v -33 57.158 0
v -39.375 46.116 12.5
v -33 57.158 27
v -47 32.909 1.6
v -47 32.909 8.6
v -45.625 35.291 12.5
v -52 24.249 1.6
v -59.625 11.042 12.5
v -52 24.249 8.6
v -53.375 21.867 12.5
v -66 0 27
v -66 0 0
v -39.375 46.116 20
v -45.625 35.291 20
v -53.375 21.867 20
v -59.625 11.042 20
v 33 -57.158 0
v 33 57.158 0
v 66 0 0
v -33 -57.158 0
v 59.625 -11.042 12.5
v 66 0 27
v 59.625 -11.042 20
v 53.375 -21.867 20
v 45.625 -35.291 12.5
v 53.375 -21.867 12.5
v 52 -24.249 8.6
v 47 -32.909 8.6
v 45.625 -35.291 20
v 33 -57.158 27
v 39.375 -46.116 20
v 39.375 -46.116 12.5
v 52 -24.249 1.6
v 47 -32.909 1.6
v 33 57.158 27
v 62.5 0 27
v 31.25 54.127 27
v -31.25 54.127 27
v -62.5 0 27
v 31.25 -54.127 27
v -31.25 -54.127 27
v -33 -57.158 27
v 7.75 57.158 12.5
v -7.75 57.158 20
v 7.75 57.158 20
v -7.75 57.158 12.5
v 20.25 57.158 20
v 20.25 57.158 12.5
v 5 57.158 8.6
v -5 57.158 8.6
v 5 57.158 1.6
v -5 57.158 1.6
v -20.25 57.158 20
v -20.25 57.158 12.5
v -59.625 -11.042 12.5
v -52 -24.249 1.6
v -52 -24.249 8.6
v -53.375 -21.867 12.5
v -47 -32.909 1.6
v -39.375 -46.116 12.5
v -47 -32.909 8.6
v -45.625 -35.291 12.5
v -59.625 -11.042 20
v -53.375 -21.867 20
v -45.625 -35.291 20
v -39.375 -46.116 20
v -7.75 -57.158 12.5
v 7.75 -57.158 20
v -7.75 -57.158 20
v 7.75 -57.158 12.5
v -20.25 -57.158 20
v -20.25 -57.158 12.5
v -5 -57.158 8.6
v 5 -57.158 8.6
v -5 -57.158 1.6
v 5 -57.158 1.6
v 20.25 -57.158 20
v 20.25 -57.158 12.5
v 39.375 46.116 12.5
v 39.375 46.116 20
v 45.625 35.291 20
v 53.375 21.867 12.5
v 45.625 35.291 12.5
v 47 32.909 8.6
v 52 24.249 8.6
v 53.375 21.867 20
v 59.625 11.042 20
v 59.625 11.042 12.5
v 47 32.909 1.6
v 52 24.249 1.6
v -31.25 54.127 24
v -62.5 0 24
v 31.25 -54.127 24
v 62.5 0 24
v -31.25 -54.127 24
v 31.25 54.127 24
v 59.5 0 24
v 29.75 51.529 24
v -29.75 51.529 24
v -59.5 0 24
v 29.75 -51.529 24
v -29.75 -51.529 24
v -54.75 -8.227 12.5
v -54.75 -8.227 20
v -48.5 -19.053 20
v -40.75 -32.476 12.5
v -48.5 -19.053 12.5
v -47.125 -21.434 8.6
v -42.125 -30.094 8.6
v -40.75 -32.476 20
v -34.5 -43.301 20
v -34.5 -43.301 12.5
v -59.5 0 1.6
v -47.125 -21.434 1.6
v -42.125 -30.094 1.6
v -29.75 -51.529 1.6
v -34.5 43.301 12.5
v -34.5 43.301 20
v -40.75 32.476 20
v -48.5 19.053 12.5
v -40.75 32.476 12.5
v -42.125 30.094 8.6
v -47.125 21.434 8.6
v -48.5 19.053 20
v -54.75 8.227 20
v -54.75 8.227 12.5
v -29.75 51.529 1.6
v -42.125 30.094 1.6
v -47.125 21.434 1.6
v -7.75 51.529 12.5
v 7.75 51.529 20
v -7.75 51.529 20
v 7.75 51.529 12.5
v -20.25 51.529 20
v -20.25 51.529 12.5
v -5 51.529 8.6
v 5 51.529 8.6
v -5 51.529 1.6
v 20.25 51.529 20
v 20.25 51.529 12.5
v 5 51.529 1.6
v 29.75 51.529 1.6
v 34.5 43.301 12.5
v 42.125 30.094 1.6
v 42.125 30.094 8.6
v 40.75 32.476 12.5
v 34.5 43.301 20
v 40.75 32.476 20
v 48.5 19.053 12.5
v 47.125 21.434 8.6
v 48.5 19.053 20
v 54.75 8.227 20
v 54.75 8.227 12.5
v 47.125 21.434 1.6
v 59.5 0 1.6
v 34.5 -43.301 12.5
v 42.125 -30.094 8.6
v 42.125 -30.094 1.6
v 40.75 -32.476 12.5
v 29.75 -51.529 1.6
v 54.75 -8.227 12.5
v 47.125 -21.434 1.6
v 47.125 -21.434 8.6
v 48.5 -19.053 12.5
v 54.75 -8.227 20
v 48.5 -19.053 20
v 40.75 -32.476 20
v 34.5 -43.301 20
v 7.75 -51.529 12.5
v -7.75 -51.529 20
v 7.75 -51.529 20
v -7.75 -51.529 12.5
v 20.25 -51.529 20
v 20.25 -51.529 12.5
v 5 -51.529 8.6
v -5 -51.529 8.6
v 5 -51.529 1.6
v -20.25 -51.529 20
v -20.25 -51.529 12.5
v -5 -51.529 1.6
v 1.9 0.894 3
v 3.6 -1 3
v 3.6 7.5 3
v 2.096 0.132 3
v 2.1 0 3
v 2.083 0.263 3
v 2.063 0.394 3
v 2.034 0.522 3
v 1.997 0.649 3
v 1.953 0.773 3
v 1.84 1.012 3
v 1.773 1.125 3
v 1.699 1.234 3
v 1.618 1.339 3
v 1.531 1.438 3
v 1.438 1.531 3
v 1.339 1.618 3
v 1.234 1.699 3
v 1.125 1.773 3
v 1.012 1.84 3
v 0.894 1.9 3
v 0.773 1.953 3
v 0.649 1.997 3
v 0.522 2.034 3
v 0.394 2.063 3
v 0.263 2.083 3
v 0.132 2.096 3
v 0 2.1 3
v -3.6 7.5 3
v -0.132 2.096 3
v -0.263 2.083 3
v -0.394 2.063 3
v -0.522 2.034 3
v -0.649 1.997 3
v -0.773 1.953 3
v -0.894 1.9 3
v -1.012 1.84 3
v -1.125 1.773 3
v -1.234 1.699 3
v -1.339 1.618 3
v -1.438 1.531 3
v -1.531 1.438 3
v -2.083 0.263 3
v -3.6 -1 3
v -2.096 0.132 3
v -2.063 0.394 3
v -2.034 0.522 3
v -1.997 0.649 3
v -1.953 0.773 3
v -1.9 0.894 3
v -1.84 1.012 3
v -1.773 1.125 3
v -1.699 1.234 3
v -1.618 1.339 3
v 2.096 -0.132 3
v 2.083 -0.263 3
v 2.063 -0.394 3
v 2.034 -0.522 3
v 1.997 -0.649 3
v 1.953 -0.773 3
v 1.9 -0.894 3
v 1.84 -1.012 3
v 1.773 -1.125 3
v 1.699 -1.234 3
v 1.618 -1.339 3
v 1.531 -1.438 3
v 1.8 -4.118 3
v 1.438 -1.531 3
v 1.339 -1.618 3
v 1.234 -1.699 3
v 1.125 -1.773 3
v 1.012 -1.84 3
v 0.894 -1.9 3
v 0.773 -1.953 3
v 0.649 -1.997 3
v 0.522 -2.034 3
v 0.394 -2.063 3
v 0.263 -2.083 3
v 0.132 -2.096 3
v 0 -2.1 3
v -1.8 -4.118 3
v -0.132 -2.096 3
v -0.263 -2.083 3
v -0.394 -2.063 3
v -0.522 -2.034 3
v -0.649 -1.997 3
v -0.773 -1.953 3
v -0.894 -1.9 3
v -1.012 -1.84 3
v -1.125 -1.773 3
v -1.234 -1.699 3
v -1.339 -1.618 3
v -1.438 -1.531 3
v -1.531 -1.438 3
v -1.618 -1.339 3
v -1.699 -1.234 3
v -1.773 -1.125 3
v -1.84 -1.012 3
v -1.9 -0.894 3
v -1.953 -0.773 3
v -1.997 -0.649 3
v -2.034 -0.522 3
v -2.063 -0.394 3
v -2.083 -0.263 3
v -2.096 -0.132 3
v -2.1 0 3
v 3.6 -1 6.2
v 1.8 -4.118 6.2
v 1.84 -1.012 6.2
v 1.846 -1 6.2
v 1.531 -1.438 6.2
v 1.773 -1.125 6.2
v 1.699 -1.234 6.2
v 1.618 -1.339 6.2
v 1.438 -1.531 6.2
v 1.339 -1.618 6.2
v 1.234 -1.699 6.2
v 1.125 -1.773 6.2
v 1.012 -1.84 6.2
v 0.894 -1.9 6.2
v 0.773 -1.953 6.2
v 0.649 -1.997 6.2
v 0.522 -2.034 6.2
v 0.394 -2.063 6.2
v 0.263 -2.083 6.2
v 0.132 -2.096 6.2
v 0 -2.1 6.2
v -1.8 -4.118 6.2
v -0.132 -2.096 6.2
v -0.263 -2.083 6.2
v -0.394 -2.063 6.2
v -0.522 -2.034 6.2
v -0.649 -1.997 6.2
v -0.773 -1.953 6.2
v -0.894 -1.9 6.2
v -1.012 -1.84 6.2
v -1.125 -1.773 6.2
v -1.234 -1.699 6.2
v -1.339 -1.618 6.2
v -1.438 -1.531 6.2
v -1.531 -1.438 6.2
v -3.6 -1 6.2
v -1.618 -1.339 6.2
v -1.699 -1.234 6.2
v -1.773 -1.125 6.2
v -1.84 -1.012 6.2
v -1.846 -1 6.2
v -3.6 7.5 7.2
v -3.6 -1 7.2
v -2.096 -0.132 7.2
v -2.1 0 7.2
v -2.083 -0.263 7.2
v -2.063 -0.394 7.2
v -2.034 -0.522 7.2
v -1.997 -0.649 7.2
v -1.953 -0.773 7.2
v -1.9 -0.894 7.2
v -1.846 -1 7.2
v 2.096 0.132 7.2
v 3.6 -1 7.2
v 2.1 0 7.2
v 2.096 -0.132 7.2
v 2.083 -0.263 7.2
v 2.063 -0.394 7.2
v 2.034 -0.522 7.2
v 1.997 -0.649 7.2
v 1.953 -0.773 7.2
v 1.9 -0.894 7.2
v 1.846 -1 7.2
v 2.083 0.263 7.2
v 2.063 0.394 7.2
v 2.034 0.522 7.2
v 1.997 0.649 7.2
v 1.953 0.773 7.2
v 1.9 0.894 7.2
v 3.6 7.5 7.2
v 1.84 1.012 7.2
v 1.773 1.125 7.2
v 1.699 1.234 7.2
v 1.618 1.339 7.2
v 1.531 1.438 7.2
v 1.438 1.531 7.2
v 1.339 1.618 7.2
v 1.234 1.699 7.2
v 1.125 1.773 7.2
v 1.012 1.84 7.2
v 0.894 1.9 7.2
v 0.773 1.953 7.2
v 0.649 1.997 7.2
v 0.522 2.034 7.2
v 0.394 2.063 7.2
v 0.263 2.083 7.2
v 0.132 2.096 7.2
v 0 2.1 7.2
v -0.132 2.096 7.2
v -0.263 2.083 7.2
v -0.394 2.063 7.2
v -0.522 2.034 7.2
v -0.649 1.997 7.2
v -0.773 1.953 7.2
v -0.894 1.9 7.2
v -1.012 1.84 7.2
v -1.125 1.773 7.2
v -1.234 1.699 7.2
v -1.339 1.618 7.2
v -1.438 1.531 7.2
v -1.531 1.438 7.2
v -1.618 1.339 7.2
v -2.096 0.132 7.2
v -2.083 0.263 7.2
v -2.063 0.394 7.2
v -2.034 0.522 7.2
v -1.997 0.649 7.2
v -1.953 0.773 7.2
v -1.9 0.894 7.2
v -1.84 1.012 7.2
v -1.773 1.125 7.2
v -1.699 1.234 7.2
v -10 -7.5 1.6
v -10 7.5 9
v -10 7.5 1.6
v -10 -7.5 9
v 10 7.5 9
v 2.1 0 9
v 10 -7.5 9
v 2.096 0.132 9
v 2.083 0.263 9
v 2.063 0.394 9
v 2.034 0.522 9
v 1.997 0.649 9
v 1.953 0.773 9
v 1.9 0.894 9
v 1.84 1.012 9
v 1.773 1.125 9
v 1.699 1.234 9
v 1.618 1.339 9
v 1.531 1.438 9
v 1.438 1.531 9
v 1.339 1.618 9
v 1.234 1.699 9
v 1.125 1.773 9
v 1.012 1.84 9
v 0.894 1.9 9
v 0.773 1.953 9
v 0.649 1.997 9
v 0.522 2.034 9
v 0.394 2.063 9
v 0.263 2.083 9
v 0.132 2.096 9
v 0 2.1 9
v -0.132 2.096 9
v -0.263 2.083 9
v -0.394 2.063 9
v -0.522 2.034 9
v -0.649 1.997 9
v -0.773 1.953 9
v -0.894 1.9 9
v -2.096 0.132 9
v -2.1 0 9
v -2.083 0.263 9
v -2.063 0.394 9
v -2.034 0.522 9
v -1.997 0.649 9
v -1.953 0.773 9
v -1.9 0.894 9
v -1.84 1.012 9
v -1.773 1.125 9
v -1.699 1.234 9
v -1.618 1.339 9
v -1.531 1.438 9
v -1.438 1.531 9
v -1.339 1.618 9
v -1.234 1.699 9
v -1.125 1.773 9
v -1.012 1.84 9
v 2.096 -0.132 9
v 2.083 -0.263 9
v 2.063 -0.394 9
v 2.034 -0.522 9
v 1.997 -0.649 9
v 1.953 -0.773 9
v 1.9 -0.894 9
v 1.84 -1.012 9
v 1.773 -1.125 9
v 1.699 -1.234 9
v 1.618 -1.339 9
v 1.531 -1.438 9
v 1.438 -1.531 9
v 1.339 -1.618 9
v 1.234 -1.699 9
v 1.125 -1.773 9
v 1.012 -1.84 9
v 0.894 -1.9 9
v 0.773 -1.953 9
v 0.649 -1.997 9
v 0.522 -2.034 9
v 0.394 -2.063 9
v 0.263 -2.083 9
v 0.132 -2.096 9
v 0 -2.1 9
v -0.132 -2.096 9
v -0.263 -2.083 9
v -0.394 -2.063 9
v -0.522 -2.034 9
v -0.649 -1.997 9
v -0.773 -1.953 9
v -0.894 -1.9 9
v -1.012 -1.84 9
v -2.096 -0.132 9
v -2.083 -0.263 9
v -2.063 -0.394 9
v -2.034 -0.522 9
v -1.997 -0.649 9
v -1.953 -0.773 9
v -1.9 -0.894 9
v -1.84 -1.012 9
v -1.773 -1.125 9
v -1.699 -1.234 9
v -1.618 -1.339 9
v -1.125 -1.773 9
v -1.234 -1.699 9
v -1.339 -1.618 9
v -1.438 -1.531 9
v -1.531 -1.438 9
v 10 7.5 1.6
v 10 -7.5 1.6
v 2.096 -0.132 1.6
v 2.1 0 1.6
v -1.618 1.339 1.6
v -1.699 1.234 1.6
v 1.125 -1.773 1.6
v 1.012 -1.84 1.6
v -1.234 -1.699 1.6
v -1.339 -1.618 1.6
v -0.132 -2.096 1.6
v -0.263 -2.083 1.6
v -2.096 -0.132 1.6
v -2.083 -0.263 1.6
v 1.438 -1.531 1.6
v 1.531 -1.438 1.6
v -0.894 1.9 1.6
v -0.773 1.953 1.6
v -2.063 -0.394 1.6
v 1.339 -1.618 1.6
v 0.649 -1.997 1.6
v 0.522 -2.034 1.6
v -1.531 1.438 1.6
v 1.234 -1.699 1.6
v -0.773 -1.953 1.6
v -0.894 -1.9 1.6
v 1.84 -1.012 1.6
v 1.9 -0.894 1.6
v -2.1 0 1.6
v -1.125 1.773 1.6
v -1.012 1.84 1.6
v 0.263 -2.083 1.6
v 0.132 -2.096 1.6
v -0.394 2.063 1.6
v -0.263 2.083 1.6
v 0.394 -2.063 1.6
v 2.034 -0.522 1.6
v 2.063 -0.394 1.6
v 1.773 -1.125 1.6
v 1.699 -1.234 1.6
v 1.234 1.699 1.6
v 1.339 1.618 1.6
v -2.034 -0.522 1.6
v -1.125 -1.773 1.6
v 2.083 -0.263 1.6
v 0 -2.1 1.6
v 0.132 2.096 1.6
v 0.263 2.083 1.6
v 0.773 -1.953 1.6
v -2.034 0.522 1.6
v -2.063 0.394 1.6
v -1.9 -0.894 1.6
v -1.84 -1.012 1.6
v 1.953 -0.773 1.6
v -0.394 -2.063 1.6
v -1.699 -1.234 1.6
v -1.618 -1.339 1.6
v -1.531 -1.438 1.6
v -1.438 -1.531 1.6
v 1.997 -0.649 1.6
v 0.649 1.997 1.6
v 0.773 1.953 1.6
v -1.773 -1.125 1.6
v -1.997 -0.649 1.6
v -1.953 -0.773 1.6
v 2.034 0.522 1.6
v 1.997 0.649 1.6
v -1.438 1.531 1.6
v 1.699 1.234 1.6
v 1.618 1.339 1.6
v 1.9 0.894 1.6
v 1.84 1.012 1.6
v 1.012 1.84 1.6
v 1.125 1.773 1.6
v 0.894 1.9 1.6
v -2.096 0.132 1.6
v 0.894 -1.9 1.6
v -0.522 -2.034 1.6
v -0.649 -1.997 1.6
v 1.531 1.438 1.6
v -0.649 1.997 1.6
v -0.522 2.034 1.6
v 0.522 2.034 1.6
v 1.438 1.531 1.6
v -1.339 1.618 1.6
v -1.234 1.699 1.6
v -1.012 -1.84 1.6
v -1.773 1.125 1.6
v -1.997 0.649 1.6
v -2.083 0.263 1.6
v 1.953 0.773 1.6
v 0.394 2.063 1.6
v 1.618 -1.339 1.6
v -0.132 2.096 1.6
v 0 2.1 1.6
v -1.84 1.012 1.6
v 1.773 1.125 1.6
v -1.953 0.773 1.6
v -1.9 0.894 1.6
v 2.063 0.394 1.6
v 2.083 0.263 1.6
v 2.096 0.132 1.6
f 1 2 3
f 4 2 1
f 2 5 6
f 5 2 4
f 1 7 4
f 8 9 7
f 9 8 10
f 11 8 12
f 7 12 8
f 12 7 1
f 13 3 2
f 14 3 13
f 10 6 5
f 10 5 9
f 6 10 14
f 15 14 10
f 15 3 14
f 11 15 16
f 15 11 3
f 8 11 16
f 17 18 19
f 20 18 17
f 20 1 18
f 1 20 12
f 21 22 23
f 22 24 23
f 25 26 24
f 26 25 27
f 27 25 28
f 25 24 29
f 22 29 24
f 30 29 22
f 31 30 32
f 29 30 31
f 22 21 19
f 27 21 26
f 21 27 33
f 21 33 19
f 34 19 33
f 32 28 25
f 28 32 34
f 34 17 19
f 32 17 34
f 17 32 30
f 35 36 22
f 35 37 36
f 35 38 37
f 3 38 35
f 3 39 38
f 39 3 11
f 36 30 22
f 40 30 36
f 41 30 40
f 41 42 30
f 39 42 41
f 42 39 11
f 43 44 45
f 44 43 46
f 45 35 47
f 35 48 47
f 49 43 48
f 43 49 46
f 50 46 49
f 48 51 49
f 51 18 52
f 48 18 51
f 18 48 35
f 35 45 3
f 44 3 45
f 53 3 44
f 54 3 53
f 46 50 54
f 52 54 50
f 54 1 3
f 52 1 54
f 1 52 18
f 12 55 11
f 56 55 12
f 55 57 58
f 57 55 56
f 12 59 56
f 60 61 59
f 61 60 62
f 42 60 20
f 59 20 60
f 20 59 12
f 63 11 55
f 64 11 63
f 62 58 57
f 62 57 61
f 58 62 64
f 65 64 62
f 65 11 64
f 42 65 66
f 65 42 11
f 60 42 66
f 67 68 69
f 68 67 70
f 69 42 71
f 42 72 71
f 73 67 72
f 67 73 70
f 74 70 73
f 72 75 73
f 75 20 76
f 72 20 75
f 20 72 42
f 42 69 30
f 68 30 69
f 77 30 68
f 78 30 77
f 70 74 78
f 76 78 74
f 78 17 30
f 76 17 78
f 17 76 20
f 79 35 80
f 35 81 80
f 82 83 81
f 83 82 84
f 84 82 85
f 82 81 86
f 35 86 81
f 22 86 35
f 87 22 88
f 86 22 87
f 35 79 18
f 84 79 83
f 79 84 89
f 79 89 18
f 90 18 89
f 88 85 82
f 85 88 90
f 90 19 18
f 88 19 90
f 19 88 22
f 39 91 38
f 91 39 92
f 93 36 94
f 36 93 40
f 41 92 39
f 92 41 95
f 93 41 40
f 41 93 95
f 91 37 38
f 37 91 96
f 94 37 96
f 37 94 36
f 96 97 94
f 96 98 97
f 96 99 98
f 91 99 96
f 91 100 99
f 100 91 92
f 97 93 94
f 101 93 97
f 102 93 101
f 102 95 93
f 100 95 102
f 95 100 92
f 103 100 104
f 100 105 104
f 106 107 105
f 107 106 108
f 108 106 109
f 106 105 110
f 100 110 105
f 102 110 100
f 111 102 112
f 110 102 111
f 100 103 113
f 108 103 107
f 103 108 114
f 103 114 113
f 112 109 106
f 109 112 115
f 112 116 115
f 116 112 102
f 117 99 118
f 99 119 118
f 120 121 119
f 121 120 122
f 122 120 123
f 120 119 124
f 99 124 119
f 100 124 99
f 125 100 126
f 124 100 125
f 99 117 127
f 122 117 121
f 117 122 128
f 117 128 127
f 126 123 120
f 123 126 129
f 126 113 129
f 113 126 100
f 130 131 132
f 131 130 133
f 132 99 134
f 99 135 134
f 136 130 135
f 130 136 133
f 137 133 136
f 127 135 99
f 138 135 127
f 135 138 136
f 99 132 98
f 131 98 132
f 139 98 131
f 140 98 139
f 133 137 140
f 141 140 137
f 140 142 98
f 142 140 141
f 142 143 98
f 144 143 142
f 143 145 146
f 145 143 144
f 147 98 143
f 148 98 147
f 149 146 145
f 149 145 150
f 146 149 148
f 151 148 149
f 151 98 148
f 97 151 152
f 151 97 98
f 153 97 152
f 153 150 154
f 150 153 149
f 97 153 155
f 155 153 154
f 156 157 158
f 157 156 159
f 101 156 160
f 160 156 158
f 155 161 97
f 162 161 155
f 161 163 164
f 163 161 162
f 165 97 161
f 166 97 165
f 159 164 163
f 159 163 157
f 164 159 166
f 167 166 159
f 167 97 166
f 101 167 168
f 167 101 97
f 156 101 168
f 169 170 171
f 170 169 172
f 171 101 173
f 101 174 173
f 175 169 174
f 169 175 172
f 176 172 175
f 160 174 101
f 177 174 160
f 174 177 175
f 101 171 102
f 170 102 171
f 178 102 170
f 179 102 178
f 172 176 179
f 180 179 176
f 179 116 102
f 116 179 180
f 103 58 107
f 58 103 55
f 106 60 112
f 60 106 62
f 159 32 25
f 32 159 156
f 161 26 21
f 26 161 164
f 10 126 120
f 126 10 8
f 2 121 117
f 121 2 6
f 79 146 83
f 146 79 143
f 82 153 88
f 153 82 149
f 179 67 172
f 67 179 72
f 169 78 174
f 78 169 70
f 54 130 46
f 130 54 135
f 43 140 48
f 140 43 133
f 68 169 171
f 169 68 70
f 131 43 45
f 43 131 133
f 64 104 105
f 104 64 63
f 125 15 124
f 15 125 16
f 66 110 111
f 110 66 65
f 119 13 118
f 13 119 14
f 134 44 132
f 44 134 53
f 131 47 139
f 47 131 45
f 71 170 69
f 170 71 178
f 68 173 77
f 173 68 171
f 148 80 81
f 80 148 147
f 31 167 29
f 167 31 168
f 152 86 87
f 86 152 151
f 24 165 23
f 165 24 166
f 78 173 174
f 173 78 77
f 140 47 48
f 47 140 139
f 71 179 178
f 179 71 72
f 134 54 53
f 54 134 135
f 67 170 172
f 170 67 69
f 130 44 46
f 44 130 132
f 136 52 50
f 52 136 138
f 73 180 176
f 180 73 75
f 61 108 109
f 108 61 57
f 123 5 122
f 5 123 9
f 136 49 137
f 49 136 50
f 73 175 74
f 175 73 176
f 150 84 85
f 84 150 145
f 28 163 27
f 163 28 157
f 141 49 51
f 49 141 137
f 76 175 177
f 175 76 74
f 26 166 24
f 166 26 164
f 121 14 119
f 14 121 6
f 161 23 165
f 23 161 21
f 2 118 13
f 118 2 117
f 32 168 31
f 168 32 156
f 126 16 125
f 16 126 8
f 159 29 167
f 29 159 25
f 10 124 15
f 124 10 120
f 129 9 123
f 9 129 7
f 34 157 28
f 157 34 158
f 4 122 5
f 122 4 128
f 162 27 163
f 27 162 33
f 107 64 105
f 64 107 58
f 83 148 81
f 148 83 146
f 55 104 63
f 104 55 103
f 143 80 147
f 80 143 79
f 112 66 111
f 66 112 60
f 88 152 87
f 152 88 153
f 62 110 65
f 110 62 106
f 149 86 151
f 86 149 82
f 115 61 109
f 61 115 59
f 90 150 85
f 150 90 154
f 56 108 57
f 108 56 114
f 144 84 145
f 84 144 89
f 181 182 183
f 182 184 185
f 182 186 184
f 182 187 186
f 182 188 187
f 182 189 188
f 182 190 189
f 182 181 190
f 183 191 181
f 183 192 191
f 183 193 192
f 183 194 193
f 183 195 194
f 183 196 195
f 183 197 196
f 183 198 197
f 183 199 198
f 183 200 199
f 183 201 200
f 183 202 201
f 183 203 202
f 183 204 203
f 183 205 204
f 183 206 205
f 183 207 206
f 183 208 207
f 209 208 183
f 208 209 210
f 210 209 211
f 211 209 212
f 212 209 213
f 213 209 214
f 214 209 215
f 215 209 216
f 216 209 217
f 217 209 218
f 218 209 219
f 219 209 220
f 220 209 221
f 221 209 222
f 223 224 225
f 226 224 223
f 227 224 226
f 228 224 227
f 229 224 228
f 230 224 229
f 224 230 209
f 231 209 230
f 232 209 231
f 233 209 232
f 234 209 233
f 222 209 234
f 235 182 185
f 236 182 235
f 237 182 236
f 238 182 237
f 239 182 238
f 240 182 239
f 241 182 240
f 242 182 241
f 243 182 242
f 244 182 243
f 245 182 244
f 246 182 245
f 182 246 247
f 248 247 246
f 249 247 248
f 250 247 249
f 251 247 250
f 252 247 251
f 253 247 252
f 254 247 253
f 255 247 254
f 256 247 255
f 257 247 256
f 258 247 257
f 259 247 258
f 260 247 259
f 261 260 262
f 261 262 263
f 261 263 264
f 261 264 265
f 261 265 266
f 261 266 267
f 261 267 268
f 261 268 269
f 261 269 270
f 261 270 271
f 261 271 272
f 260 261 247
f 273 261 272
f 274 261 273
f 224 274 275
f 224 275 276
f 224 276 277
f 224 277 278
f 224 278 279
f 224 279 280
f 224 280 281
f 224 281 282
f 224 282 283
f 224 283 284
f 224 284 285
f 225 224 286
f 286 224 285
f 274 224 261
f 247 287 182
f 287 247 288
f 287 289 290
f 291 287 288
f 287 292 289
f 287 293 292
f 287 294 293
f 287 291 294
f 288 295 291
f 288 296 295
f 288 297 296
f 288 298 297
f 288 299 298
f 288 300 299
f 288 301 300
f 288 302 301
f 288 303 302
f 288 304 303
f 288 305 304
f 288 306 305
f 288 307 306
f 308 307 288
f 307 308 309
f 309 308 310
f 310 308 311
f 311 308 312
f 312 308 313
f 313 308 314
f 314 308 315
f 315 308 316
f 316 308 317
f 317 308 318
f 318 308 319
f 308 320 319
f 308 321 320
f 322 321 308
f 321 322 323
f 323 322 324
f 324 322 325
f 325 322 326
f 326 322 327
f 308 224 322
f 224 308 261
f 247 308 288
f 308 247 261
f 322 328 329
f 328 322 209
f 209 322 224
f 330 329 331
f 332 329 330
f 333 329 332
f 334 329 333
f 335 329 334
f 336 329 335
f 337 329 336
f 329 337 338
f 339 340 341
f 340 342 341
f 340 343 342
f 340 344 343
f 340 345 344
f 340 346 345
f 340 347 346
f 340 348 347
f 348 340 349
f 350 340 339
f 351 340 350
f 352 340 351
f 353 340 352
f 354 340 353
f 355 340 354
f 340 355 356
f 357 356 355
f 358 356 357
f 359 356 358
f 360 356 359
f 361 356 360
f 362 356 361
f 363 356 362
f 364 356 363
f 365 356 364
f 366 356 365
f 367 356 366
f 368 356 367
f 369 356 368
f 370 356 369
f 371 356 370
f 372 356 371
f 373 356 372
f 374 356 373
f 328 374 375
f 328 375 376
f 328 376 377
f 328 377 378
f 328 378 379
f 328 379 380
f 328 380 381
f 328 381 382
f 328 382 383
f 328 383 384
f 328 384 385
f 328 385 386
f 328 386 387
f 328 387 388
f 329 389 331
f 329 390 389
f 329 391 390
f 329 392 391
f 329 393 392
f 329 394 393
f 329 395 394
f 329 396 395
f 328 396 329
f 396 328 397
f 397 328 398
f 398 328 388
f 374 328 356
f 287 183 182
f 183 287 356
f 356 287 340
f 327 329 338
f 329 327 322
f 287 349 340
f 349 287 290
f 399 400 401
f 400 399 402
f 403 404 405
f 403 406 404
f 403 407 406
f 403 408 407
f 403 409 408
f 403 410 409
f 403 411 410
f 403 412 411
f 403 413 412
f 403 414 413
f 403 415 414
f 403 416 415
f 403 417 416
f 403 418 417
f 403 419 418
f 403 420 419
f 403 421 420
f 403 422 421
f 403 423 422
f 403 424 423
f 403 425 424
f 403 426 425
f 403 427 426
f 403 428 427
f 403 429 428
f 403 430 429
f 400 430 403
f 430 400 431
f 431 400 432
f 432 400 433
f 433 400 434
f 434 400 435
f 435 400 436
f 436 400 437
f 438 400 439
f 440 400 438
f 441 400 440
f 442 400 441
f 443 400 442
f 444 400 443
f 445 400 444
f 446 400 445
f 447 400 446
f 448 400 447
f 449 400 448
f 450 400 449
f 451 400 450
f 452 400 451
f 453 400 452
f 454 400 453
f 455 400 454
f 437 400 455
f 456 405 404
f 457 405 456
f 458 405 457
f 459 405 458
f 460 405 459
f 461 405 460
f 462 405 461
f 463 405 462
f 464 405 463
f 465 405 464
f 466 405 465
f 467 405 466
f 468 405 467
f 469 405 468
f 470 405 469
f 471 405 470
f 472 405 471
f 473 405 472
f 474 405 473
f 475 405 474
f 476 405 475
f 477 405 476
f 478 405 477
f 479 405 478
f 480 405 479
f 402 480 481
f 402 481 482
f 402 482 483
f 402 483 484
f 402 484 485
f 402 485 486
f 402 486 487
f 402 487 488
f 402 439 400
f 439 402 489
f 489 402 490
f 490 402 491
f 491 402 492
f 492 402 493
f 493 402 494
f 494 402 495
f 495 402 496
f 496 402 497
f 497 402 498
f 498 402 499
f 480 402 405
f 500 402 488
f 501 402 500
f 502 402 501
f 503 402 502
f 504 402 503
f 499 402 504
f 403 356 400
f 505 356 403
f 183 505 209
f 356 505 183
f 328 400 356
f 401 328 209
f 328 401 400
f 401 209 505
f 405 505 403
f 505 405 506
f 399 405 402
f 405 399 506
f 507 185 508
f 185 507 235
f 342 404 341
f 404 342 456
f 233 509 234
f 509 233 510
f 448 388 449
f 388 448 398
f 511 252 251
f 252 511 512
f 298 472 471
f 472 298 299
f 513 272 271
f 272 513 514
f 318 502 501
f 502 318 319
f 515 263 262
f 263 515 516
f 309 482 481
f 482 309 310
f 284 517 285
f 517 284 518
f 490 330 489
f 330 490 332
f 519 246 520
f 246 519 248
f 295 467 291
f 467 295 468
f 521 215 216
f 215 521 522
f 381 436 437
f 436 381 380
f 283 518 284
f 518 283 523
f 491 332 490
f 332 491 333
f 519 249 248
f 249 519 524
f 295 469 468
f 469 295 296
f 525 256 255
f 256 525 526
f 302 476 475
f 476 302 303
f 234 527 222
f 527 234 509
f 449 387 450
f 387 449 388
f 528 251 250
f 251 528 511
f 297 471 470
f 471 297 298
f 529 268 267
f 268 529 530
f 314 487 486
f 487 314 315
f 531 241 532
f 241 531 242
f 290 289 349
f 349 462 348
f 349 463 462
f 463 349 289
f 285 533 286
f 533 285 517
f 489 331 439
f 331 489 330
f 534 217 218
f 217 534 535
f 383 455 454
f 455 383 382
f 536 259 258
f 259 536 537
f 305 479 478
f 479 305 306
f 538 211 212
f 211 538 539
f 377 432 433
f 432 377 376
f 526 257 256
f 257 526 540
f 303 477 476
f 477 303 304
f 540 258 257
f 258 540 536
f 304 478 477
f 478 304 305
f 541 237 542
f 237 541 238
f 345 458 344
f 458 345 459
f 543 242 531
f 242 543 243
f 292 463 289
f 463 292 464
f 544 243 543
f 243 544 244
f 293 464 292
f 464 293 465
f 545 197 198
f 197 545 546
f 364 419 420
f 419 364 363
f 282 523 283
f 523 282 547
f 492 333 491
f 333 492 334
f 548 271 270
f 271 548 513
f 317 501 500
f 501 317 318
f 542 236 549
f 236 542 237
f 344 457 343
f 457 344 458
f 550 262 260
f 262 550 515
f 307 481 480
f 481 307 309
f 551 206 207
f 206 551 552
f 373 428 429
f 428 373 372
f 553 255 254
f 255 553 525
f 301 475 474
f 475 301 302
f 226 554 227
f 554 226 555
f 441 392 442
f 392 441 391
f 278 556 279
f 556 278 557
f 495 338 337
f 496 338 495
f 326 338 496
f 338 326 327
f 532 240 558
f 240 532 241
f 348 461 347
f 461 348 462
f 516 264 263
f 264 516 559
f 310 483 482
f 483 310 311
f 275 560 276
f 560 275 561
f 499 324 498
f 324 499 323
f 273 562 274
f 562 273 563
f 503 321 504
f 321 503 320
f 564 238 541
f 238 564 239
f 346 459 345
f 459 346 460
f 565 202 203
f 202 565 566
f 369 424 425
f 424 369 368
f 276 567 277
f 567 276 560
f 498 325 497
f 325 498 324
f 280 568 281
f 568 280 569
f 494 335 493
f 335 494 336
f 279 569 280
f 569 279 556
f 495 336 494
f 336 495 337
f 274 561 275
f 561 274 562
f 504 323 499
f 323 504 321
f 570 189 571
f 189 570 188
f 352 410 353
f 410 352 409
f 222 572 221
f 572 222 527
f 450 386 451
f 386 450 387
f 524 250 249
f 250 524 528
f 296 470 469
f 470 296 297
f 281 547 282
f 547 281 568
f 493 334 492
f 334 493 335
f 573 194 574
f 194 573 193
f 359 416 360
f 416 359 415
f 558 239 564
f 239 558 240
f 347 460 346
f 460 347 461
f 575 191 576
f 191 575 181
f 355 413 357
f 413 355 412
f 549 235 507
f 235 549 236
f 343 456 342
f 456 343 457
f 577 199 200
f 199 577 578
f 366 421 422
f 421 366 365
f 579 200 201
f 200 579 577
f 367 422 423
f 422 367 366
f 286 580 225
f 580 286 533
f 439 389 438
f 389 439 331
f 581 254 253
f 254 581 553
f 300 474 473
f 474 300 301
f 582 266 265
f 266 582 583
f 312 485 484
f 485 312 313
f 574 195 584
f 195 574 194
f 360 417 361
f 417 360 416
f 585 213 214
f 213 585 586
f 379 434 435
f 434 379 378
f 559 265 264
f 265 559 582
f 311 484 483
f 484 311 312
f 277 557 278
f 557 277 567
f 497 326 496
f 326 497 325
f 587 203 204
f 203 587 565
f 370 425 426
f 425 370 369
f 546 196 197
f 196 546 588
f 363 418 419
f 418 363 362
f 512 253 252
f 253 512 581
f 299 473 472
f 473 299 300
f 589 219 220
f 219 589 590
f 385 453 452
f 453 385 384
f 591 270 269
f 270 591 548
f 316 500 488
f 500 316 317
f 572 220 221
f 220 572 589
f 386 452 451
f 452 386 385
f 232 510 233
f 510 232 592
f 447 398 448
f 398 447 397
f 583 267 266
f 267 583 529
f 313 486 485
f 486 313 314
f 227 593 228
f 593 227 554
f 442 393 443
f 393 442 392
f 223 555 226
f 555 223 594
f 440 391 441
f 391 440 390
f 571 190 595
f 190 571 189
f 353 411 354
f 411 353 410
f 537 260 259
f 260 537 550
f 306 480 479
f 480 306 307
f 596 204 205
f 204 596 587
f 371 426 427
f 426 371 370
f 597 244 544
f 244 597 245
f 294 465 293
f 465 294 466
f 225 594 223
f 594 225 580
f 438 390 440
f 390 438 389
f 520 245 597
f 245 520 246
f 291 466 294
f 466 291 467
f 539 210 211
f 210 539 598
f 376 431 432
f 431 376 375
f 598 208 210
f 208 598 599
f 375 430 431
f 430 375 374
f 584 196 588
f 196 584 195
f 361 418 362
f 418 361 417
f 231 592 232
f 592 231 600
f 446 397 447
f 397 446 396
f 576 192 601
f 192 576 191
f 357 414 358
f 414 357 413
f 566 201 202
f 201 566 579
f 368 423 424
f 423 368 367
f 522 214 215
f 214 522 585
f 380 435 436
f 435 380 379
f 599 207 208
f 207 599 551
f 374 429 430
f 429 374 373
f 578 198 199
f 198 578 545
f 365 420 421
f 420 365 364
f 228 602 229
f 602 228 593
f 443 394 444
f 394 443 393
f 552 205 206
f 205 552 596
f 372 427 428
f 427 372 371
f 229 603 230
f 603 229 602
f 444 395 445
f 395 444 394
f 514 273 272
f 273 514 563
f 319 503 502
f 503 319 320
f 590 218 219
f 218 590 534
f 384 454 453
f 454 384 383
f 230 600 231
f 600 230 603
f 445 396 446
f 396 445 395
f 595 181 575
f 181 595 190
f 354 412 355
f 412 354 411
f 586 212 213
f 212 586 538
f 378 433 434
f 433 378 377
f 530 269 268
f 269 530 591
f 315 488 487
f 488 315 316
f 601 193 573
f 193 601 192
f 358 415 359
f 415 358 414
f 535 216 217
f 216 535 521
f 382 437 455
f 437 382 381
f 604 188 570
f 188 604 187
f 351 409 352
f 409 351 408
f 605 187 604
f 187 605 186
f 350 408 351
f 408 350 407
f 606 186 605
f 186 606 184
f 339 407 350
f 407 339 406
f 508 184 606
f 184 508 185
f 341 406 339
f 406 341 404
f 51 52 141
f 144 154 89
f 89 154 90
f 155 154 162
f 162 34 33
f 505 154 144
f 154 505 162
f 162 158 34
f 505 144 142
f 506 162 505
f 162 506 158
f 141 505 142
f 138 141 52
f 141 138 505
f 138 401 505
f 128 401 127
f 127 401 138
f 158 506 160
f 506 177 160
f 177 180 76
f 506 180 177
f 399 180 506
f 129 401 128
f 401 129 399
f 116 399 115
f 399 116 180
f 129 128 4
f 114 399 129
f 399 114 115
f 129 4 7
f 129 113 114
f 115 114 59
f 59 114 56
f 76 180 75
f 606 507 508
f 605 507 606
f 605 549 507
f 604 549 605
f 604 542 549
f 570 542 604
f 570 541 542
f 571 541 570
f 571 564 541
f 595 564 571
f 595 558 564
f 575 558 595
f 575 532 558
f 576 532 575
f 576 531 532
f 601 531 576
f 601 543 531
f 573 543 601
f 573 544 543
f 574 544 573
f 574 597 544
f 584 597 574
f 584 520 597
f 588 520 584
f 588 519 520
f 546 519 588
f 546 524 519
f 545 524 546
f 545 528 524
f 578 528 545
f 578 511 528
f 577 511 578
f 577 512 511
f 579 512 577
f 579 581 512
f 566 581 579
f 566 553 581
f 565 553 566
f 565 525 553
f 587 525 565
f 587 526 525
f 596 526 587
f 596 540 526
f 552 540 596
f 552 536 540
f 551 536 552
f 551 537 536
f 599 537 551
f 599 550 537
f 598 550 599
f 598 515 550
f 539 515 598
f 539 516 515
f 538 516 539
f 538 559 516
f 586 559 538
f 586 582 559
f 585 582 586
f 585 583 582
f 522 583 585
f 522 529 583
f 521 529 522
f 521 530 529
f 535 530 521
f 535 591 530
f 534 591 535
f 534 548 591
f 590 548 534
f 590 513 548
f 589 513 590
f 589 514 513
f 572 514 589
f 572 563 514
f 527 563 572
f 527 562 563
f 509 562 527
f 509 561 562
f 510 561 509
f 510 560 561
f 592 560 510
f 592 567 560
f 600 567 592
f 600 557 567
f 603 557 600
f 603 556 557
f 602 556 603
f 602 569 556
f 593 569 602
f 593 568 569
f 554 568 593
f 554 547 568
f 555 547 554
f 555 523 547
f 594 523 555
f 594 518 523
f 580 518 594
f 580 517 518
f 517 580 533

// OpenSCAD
// file: pcb-mount.scad
include <config.scad>

module pcb_mount() {
    
    difference() {
        $fn = 100;
        linear_extrude(8)
        square([ 20, 15 ], center=true);
        linear_extrude(10)
        circle(d=4.2);


        translate([0, 0, 2])
        union() {
            $fn = 6;
            linear_extrude(3.2)
            translate([0, -1, 0])
            circle(d=7.2);

            translate([0, 5, 0])
            linear_extrude(4.2)
            square([7.2, 12], center=true);
        }  
    }
}

//pcb_mount();
// file: config.scad
HEX_WIDTH= 125;
HEX_BORDER = 7;
HEX_HEIGHT = 27;
HEX_ARM = HEX_WIDTH / 6;
SHIELD_THICKNESS = 3;

SNAPFIT_DEPTH = 12.5;
SNAPFIT_HEIGHT = 7.5;
// main file
include <config.scad>;
include <pcb-mount.scad>;

$fn = 6;

module snapfit_xtor() {
    hole_width = SNAPFIT_DEPTH;
    hole_height = SNAPFIT_HEIGHT;
    dist_y = 20;
    
    translate([14, 0, dist_y - hole_height])
    union() {
        linear_extrude(hole_height)
        square([hole_width, 200], center=true);
    }
}

module wire_channel() {
    translate([14, 0, 11.6])
    translate([-14, 0, -11])
    linear_extrude(8)
    square([10, 1000], center=true);
}

module all_sides() {
    children();
    rotate(60)
    children();
    rotate(120)
    children();
}

// Make an interior strengthening wall
difference() {
    union() {
        linear_extrude(HEX_HEIGHT - SHIELD_THICKNESS)
        difference() {
            $fn = 6;
            circle(d=HEX_WIDTH);
            circle(d=HEX_WIDTH - 6);
            
        }

        difference() {
            linear_extrude(HEX_HEIGHT)
            circle(d=HEX_WIDTH + HEX_BORDER);

            linear_extrude(HEX_HEIGHT + 1)
            circle(d=HEX_WIDTH);

        }
    }

    all_sides()
    union() {
        snapfit_xtor();
        
        mirror([1,0,0])
        snapfit_xtor();
        
        wire_channel();
    }
}


// Floor
color("red")
linear_extrude(1.6)
circle(d=HEX_WIDTH + HEX_BORDER, $fn=6);

translate([0, 0, 1])
pcb_mount();
